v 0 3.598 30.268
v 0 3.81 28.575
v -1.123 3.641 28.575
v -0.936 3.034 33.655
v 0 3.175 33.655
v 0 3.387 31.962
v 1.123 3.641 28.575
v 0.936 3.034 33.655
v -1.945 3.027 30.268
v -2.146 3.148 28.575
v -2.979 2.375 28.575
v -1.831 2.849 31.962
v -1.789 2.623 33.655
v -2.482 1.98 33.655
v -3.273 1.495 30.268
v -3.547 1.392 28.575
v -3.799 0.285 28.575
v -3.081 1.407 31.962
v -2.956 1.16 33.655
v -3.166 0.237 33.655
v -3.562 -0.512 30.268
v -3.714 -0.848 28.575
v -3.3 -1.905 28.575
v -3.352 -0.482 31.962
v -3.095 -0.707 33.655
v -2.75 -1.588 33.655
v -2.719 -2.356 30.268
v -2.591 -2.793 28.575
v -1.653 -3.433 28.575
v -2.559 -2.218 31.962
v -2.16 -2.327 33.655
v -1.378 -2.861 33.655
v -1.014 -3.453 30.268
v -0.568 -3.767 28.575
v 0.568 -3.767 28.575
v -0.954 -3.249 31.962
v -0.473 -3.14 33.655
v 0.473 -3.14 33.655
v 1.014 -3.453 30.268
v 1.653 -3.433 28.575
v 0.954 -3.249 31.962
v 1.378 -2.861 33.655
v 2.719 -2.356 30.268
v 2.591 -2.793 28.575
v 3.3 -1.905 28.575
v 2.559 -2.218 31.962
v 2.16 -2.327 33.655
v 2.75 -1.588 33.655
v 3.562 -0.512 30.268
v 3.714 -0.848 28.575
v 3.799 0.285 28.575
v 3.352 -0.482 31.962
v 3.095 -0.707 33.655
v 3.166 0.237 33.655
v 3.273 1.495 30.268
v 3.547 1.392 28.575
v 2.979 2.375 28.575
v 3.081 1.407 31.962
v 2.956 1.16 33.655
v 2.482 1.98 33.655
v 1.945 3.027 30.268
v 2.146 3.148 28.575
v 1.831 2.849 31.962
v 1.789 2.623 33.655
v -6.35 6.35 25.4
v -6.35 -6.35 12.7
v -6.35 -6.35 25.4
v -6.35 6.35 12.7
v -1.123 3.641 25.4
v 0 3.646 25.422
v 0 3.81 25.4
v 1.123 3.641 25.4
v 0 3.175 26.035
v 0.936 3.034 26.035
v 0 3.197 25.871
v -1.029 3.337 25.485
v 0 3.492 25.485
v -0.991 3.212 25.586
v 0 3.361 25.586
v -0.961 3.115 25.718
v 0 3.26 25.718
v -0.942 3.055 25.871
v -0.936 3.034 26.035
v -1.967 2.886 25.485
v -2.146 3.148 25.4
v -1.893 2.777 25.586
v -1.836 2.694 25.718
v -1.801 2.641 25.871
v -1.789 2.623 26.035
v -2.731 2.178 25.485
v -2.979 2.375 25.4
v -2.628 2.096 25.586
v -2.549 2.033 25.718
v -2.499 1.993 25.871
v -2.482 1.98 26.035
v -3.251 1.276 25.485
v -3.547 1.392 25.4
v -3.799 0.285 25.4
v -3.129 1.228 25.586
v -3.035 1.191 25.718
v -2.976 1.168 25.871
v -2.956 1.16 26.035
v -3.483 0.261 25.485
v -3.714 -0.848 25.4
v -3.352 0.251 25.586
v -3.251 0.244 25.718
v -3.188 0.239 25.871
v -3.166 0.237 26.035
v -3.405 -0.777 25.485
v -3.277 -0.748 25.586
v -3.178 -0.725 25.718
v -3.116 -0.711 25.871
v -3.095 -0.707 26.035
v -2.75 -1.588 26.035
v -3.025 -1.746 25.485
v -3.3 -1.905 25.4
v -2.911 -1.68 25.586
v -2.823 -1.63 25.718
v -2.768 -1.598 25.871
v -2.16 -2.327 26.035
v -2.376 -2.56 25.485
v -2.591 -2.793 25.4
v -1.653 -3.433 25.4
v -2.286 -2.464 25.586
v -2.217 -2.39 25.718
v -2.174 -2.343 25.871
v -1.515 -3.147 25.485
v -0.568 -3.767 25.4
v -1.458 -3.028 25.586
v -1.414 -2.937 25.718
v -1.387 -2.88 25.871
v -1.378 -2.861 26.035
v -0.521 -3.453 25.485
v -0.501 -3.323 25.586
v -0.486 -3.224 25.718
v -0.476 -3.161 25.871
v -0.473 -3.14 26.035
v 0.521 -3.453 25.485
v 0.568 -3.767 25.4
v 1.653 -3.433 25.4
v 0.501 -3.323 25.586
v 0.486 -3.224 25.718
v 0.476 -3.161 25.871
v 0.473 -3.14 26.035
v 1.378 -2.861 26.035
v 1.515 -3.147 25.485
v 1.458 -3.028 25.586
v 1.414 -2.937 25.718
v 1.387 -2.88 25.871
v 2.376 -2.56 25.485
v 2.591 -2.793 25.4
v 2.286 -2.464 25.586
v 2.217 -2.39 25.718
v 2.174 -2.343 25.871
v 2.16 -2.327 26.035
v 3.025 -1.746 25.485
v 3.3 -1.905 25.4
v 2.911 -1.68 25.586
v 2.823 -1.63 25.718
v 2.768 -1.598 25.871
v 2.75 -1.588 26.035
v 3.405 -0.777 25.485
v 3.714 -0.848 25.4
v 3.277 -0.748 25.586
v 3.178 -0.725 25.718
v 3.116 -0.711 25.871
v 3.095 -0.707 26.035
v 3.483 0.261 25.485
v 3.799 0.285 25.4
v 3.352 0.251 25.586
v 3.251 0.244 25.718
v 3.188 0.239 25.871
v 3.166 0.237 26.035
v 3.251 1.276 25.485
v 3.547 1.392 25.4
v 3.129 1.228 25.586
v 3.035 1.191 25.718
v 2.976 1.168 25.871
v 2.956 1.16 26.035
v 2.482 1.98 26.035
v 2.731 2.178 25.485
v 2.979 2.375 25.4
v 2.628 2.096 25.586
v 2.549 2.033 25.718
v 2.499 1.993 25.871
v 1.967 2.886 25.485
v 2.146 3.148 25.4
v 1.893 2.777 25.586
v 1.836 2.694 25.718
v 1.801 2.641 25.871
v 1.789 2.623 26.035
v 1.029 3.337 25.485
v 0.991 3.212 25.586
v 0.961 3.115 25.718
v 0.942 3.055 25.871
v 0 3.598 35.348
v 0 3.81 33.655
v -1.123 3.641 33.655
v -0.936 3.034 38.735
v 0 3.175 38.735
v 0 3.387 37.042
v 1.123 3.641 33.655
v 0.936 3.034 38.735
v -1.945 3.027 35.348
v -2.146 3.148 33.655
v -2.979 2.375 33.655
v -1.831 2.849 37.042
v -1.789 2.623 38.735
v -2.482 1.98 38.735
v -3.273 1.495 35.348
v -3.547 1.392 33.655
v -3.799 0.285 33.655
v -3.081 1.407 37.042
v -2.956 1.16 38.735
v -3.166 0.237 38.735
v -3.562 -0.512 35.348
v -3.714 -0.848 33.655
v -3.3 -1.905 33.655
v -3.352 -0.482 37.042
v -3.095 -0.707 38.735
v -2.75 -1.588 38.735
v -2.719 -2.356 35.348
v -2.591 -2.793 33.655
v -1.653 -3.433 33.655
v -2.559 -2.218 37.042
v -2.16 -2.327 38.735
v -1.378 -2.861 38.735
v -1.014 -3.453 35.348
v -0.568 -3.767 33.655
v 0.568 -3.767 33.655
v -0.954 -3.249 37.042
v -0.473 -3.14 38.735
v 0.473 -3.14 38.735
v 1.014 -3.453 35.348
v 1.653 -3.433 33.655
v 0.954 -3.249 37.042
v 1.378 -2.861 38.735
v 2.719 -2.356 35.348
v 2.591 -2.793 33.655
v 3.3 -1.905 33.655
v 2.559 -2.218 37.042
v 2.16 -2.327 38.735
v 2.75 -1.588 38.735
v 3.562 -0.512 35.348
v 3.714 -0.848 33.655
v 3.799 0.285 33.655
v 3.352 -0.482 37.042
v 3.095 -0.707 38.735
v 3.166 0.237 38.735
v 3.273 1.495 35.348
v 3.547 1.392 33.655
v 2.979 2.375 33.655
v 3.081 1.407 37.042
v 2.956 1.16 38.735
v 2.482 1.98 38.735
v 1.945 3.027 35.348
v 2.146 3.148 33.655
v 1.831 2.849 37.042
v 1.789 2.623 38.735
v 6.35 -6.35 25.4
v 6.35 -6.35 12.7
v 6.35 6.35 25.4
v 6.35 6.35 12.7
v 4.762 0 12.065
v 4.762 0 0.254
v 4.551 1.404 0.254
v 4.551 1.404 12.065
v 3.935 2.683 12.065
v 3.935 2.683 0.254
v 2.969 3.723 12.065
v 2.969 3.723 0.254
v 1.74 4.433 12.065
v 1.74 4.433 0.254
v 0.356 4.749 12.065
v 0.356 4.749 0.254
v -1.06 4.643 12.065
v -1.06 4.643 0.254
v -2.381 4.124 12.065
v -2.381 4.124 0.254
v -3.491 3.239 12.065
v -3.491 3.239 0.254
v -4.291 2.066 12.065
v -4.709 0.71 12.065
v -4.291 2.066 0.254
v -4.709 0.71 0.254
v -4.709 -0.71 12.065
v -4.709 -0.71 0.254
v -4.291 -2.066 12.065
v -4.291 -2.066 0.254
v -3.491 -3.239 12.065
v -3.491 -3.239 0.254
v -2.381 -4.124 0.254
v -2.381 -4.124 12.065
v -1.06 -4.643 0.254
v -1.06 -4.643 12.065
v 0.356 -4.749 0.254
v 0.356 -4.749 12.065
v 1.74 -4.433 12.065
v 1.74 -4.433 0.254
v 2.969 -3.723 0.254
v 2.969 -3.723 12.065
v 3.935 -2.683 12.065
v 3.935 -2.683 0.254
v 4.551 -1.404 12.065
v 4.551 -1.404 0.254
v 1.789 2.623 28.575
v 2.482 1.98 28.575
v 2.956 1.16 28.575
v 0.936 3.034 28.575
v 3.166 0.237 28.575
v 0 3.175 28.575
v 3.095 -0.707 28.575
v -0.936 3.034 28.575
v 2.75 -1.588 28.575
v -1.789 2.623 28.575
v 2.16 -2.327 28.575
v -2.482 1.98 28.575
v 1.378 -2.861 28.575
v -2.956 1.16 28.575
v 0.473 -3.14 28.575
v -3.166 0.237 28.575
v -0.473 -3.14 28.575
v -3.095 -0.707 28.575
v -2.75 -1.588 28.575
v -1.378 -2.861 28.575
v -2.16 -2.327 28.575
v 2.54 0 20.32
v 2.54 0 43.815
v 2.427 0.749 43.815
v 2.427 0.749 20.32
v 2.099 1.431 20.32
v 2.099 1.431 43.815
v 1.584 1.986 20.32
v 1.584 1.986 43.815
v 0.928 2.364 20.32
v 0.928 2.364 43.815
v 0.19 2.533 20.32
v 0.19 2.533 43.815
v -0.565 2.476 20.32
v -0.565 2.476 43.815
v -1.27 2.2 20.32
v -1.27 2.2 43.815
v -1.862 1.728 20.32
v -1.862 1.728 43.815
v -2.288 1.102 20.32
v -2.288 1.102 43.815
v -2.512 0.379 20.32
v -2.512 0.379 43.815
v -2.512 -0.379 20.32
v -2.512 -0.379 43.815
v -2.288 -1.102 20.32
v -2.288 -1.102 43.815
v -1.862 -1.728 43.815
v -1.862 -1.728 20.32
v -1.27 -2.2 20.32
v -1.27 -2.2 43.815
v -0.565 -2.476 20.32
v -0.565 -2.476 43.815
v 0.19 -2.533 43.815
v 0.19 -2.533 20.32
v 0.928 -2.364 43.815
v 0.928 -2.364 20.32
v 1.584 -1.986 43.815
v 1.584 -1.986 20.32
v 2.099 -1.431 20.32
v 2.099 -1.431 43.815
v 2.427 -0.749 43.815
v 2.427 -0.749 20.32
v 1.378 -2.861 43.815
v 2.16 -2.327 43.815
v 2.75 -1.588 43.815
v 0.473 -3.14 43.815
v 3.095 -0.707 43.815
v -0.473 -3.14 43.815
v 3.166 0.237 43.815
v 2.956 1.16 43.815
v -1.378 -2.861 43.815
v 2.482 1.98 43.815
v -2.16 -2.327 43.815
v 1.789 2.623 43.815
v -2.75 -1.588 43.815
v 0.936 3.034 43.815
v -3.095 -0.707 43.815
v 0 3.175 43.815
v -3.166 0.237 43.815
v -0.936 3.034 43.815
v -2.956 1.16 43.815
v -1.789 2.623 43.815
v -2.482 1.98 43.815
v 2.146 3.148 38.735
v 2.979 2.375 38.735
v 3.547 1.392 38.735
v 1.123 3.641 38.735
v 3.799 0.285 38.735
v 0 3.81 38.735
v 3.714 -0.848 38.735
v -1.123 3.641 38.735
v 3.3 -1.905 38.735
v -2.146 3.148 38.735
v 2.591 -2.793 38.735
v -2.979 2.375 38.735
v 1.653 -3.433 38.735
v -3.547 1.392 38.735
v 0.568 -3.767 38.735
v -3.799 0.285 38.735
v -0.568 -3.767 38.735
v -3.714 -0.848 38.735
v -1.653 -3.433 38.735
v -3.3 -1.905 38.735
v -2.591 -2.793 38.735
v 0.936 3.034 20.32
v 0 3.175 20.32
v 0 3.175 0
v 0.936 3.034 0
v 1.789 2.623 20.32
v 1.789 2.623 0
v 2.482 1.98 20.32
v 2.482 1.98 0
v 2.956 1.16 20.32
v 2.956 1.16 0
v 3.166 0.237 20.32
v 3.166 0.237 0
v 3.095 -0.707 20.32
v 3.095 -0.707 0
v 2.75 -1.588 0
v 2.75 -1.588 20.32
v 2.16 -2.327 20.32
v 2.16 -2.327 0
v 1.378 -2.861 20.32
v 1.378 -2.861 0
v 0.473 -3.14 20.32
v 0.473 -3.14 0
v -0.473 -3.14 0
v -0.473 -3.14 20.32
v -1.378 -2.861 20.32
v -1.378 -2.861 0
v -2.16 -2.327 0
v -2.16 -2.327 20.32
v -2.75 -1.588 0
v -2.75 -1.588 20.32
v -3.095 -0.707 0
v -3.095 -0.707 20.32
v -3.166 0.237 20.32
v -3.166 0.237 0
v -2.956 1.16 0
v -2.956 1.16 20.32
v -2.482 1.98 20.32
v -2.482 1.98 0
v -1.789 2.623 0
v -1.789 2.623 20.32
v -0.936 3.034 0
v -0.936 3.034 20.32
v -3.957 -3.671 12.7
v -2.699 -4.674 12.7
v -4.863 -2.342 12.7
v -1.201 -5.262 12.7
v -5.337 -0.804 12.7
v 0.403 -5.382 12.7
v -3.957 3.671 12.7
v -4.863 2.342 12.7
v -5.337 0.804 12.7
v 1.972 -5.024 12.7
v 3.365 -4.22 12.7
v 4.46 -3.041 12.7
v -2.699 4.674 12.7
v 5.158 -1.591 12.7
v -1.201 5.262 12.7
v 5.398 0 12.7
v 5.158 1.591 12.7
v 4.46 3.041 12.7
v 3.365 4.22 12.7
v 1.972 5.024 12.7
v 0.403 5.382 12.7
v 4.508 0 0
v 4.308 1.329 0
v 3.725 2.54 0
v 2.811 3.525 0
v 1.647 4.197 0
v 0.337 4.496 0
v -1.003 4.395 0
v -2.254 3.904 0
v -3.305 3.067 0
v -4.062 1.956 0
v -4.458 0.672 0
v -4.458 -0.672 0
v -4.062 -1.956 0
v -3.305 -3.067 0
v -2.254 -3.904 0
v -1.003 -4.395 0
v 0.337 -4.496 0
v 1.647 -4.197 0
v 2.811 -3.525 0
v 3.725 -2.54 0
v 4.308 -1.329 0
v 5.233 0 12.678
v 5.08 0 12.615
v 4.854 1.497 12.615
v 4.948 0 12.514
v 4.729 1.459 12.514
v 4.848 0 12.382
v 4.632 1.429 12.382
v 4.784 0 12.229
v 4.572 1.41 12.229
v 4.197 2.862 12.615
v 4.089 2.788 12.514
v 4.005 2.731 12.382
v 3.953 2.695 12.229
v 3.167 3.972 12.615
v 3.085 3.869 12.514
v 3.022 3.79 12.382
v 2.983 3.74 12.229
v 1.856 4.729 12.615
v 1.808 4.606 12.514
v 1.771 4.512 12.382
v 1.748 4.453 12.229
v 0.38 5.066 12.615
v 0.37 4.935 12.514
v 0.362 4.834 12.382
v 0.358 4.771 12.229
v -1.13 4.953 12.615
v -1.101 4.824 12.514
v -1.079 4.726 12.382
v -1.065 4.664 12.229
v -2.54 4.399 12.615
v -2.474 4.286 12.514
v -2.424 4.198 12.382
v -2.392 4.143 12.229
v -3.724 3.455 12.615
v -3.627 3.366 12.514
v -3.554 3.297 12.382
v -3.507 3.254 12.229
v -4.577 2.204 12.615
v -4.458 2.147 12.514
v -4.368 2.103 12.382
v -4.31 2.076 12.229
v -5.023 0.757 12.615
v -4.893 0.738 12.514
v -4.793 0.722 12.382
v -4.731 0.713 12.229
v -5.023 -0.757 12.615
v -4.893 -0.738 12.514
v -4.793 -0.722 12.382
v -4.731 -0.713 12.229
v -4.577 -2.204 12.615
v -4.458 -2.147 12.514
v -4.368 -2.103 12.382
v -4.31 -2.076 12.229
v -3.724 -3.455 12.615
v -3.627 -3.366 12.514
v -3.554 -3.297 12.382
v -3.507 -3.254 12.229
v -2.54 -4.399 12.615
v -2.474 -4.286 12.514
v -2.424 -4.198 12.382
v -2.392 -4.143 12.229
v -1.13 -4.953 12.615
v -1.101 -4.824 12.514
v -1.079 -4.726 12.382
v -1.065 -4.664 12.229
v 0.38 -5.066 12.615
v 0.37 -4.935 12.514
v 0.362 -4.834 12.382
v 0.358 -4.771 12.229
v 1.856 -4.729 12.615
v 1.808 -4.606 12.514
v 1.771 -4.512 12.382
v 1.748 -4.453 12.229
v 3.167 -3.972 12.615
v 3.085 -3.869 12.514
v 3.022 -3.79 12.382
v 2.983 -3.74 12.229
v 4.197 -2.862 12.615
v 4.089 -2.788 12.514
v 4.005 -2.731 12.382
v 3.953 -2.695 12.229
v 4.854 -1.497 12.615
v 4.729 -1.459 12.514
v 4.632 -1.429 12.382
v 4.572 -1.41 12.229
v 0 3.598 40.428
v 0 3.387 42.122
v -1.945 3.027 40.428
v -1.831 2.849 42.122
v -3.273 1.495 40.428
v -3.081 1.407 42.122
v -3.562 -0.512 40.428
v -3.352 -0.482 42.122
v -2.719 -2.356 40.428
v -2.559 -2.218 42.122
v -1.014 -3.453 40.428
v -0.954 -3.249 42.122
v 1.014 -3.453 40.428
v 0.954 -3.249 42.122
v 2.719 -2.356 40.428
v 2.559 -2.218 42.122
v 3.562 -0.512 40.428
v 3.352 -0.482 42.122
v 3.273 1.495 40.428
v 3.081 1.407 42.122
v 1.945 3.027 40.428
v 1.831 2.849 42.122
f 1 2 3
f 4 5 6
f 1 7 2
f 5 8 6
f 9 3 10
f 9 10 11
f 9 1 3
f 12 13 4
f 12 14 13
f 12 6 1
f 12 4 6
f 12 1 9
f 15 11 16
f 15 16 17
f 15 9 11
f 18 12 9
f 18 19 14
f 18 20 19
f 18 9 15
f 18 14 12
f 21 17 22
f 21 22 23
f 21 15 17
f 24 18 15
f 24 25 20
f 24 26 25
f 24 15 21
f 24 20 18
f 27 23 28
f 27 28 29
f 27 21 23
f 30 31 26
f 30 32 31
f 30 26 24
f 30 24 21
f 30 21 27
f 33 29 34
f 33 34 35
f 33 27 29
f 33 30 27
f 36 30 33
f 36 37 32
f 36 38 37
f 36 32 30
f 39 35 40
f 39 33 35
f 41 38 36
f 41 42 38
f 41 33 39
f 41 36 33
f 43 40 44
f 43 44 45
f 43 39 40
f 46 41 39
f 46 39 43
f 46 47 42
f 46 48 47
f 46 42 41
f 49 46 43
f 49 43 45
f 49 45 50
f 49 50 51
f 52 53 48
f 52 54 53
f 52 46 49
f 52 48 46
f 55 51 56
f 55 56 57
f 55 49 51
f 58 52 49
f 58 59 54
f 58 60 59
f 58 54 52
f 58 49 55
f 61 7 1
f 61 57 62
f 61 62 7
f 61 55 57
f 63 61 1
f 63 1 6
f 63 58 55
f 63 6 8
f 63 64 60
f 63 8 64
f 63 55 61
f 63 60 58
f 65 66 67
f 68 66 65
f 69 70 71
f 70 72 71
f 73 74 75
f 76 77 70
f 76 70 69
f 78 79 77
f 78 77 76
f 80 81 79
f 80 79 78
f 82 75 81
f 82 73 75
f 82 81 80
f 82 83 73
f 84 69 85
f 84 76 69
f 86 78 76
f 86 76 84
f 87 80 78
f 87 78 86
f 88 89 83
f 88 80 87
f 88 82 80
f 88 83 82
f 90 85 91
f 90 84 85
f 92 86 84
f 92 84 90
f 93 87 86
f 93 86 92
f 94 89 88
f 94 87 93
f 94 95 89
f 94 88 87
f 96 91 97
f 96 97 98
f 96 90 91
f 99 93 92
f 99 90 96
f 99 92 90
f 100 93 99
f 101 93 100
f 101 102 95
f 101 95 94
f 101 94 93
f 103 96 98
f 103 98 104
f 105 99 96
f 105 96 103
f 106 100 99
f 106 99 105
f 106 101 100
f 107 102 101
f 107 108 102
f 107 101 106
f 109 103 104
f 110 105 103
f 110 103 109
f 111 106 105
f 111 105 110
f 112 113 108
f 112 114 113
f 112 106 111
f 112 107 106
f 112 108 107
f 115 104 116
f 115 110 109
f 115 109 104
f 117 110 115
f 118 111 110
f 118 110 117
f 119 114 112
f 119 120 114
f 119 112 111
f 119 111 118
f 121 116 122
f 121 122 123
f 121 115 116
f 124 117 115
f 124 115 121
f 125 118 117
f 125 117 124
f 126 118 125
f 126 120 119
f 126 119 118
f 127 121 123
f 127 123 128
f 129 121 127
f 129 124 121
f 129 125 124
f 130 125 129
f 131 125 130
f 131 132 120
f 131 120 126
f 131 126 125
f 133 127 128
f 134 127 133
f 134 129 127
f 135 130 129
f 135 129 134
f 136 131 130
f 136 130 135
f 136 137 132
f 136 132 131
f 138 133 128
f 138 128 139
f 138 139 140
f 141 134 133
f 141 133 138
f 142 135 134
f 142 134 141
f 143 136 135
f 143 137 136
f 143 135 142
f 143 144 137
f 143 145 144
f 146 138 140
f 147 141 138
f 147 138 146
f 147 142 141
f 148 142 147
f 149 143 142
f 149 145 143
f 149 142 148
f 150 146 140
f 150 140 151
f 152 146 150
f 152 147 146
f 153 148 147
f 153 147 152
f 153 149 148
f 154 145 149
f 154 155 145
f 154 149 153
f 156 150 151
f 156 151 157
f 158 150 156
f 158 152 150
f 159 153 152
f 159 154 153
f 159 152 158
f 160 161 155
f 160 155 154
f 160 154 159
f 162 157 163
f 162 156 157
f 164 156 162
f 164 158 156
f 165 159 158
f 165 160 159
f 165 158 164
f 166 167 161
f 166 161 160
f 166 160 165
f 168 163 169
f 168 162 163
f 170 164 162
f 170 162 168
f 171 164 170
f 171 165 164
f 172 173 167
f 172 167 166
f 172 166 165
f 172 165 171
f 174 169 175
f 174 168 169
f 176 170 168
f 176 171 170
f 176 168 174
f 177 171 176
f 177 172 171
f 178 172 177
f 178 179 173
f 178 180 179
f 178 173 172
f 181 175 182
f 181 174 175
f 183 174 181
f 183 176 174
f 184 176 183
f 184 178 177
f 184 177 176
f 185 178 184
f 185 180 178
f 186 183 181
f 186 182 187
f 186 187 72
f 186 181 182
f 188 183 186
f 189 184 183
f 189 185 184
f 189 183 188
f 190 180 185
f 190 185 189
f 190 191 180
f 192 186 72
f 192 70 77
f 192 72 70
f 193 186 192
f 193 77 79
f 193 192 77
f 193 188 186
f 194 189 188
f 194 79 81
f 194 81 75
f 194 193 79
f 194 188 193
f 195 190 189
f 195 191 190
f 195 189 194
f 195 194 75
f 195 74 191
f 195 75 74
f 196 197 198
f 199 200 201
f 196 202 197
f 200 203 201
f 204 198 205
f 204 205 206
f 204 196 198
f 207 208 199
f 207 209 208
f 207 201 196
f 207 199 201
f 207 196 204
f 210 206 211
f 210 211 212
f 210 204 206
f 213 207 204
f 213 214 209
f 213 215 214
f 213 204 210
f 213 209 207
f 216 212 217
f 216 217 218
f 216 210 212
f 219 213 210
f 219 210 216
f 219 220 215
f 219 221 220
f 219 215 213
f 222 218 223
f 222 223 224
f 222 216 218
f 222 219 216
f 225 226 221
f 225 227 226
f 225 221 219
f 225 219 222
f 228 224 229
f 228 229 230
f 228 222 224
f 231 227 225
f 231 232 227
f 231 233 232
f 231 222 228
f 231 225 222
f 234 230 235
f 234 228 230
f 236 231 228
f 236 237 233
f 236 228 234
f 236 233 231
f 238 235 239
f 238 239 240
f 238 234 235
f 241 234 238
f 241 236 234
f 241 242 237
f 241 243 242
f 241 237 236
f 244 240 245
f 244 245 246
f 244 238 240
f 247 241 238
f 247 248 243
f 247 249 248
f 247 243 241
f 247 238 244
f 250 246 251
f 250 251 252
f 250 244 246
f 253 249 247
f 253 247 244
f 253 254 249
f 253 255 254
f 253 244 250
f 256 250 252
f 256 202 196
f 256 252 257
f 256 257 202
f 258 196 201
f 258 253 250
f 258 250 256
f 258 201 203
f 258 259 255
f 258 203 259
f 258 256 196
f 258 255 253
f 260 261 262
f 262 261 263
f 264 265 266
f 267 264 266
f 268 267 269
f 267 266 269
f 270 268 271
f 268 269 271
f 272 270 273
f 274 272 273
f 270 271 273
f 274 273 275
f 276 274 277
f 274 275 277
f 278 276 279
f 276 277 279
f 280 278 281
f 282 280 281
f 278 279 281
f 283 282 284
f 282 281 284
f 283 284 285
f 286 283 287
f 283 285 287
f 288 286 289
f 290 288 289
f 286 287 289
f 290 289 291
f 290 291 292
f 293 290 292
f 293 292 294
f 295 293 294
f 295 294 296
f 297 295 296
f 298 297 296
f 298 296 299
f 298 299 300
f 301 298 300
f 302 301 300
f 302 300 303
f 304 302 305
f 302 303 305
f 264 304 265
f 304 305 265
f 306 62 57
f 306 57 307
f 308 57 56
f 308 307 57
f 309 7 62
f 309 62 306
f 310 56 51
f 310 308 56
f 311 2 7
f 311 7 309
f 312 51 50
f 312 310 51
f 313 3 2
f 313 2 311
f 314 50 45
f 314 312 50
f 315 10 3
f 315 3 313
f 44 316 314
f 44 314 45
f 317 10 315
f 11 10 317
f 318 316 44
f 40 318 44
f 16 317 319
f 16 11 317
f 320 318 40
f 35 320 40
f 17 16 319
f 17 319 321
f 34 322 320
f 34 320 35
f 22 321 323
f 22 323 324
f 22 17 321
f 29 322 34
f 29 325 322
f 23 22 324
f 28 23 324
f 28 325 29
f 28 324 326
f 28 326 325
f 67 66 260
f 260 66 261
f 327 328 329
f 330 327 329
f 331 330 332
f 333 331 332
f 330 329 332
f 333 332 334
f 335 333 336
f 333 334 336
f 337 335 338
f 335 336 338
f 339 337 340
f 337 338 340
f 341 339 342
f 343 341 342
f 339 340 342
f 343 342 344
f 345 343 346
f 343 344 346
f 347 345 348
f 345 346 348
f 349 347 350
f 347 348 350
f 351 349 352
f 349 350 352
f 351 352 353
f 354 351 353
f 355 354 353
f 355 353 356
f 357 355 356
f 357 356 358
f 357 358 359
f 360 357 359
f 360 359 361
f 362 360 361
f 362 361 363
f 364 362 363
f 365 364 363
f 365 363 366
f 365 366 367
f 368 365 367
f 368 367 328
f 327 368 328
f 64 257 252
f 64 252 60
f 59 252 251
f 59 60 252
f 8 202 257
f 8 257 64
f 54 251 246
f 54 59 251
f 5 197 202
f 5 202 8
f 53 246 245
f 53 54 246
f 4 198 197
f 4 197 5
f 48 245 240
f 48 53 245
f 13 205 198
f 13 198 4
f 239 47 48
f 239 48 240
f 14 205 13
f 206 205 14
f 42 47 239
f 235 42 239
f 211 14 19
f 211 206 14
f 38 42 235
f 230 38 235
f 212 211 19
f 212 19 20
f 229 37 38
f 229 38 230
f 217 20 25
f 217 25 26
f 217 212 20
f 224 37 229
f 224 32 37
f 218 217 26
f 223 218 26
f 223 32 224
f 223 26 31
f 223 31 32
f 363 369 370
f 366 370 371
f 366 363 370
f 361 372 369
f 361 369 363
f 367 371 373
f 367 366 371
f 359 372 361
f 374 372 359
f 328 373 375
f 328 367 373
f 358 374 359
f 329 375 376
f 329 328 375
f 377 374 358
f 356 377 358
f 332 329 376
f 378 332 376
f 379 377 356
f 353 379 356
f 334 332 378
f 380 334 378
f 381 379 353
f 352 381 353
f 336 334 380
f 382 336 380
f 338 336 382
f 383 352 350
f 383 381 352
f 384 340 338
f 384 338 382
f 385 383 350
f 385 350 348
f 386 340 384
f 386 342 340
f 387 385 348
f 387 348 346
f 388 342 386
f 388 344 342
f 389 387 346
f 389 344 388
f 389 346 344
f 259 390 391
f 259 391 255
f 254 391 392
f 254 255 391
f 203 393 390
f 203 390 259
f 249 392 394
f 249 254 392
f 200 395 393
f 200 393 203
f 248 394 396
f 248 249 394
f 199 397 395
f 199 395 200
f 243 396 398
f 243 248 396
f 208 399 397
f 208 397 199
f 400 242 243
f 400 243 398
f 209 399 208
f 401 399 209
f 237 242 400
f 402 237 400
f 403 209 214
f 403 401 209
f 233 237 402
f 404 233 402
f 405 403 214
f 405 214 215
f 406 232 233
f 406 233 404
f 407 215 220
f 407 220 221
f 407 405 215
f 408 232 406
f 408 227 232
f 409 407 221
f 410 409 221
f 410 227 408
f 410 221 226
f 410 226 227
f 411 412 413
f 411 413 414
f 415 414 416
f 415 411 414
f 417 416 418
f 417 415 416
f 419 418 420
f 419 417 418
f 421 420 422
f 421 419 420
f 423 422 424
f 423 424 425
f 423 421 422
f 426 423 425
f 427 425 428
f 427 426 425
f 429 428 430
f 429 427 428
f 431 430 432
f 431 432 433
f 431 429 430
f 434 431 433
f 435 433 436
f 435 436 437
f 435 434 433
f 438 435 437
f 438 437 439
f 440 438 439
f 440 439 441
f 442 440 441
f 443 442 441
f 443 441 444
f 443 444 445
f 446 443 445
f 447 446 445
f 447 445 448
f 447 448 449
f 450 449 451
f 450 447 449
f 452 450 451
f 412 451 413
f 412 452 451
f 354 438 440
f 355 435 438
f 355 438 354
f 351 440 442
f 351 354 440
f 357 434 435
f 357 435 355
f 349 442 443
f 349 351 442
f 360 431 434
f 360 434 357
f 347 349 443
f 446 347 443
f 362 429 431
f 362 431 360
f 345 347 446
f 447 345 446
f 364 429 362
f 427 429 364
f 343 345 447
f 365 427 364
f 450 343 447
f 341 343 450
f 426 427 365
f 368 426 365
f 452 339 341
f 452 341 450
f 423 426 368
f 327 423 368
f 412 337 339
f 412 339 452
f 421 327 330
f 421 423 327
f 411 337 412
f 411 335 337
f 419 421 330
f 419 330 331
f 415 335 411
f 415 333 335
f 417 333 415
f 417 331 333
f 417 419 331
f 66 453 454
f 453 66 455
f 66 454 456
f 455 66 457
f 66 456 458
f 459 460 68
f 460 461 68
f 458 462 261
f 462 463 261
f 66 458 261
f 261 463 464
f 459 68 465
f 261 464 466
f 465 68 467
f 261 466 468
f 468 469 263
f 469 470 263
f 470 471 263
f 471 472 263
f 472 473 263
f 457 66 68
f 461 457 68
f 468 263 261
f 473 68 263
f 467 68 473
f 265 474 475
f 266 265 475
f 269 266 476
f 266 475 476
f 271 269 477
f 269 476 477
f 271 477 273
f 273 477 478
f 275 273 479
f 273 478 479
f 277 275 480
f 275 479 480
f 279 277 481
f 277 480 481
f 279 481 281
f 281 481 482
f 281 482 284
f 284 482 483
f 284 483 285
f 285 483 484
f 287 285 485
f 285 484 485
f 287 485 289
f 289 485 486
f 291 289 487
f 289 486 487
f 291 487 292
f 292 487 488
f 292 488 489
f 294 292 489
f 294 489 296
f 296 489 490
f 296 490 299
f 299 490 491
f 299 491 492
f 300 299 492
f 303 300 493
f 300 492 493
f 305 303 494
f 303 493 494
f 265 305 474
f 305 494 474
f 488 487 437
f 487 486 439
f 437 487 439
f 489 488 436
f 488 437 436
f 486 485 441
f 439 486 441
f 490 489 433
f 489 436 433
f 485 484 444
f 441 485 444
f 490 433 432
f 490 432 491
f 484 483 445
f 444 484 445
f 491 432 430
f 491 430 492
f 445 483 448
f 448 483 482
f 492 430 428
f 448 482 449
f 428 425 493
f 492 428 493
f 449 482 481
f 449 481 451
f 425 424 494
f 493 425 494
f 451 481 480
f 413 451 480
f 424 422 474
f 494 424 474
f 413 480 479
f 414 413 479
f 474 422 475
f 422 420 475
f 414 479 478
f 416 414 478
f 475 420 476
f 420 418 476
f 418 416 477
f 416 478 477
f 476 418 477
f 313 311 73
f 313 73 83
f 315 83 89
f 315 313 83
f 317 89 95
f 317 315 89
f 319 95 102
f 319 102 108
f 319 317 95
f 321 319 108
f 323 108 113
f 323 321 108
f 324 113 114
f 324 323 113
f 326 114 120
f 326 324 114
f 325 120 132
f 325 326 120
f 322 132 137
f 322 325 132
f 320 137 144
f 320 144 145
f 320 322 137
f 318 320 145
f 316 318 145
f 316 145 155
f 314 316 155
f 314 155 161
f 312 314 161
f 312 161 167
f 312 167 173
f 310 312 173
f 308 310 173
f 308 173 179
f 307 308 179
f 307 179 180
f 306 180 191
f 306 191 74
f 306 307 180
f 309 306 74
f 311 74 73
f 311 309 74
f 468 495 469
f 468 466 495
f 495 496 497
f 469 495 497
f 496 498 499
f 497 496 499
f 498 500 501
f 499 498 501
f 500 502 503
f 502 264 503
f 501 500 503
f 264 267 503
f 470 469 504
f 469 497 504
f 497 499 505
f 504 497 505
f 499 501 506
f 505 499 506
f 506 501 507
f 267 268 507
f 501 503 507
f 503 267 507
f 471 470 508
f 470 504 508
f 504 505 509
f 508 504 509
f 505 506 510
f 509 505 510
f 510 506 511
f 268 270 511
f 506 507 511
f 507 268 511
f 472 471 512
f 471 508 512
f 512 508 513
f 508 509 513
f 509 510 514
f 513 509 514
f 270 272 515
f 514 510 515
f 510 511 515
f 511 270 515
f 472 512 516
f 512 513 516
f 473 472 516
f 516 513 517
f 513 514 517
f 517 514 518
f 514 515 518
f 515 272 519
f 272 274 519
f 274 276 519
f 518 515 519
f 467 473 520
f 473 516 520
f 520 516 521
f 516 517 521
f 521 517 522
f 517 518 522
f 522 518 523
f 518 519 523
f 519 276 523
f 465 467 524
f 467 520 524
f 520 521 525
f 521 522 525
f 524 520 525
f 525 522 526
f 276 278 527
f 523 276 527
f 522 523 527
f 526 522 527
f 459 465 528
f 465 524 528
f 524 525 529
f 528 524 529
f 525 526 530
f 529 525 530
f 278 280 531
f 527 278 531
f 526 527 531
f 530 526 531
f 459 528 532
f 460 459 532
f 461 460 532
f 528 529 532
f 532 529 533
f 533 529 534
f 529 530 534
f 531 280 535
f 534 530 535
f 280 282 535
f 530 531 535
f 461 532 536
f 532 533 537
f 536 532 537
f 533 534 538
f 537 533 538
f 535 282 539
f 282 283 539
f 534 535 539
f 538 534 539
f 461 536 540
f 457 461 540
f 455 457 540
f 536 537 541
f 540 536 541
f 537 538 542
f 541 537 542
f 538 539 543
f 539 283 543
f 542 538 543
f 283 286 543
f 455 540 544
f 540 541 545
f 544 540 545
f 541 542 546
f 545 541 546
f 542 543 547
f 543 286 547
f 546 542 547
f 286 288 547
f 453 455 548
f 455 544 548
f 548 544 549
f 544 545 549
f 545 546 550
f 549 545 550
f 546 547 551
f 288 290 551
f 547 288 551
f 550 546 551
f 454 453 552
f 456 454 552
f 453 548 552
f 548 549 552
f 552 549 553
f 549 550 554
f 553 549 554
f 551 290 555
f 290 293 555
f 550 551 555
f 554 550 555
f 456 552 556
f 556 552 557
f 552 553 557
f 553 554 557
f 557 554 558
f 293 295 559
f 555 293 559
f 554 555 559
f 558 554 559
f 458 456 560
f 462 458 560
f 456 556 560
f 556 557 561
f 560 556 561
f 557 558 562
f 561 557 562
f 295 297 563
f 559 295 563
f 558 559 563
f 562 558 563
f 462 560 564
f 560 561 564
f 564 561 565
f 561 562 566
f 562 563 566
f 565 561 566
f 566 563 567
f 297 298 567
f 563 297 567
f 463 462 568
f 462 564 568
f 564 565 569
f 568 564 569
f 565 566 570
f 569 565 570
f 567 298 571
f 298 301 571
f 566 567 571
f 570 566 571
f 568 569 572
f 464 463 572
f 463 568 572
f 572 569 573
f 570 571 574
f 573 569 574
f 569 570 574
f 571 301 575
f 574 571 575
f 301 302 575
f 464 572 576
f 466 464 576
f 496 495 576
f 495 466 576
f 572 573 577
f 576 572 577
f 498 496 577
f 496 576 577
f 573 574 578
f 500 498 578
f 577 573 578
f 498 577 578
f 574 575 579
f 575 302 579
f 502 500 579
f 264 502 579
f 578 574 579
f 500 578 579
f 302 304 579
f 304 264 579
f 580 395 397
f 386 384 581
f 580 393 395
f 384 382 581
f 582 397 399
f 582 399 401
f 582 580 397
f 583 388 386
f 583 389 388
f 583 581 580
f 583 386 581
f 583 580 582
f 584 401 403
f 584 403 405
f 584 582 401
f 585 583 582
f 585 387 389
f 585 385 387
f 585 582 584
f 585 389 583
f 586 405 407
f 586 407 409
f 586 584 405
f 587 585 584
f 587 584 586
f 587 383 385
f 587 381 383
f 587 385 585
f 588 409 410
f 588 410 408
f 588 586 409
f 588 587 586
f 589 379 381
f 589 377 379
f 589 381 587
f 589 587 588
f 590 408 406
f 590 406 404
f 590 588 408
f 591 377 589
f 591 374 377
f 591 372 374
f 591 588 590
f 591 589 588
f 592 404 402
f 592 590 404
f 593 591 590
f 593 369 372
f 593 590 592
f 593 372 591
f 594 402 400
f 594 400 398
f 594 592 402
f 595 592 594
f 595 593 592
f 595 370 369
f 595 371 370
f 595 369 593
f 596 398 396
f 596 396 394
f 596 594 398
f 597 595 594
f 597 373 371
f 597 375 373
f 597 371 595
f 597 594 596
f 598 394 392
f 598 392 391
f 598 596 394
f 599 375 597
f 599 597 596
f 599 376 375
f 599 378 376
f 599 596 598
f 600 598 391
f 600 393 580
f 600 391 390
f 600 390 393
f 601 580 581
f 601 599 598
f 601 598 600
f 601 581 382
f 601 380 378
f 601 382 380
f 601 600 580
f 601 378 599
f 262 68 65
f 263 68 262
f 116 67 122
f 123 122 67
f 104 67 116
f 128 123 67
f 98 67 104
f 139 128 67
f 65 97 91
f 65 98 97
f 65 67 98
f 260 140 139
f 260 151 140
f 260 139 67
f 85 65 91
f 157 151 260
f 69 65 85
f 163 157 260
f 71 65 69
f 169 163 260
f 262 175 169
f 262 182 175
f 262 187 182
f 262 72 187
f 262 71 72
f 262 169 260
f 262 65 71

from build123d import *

# Parameters (mm, degrees)
SKETCH1_R           = 4.7625
BOSS_EXTRUDE1_DEPTH = 12.7
CHAMFER1_SIZE       = 0.254
SKETCH2_W           = 12.7
SKETCH2_H           = 12.7
BOSS_EXTRUDE2_DEPTH = 12.7
FILLET1_R           = 0.635
CUT_EXTRUDE2_START  = -20.32
SKETCH5_R           = 3.175
CUT_EXTRUDE2_DEPTH  = 20.32
SKETCH6_R           = 2.54
CUT_EXTRUDE3_DEPTH  = 23.876


with BuildPart() as part:
    # Sketch1 → Boss-Extrude1 (new body)
    with BuildSketch(Plane.XY):
        Circle(SKETCH1_R)
    extrude(amount=BOSS_EXTRUDE1_DEPTH)

    # Chamfer1
    chamfer1_edges = [part.edges().sort_by_distance(p)[0] for p in [
        (-4.7625, 0, 0),
    ]]
    chamfer(chamfer1_edges, length=CHAMFER1_SIZE)

    # Sketch2 → Boss-Extrude2 (add)
    with BuildSketch(Plane.XY.offset(12.7)):
        Rectangle(SKETCH2_W, SKETCH2_H)
    extrude(amount=BOSS_EXTRUDE2_DEPTH)

    # Sketch3 → Revolve1 (revolve)
    with BuildSketch(Plane(origin=(0, 0, 0), x_dir=(0, 0, -1), z_dir=(1, 0, 0))):
        Polygon((-25.4, 3.175), (-28.575, 3.175), (-28.575, 3.81), (-33.655, 3.175), (-33.655, 3.81), (-38.735, 3.175), (-38.735, 3.81), (-43.815, 3.175), (-43.815, 0), (-25.4, 0), align=None)
    revolve(axis=Axis((0, 0, 19.05), (0, 0, 1)))

    # Fillet1
    fillet1_edges = [part.edges().sort_by_distance(p)[0] for p in [
        (0, -3.175, 25.4),
        (-4.7625, 0, 12.7),
    ]]
    fillet(fillet1_edges, radius=FILLET1_R)

    # Sketch5 → Cut-Extrude2 (cut)
    with BuildSketch(Plane(origin=(0, 0, 0), x_dir=(-1, 0, 0), z_dir=(0, 0, -1)).offset(CUT_EXTRUDE2_START)):
        with Locations(Location((0, 0, 0), (0, 0, 90))):
            Circle(SKETCH5_R)
    extrude(amount=CUT_EXTRUDE2_DEPTH, mode=Mode.SUBTRACT)

    # Sketch6 → Cut-Extrude3 (cut)
    with BuildSketch(Plane.XY.offset(43.815)):
        Circle(SKETCH6_R)
    extrude(amount=-CUT_EXTRUDE3_DEPTH, mode=Mode.SUBTRACT)


solid = part.part
